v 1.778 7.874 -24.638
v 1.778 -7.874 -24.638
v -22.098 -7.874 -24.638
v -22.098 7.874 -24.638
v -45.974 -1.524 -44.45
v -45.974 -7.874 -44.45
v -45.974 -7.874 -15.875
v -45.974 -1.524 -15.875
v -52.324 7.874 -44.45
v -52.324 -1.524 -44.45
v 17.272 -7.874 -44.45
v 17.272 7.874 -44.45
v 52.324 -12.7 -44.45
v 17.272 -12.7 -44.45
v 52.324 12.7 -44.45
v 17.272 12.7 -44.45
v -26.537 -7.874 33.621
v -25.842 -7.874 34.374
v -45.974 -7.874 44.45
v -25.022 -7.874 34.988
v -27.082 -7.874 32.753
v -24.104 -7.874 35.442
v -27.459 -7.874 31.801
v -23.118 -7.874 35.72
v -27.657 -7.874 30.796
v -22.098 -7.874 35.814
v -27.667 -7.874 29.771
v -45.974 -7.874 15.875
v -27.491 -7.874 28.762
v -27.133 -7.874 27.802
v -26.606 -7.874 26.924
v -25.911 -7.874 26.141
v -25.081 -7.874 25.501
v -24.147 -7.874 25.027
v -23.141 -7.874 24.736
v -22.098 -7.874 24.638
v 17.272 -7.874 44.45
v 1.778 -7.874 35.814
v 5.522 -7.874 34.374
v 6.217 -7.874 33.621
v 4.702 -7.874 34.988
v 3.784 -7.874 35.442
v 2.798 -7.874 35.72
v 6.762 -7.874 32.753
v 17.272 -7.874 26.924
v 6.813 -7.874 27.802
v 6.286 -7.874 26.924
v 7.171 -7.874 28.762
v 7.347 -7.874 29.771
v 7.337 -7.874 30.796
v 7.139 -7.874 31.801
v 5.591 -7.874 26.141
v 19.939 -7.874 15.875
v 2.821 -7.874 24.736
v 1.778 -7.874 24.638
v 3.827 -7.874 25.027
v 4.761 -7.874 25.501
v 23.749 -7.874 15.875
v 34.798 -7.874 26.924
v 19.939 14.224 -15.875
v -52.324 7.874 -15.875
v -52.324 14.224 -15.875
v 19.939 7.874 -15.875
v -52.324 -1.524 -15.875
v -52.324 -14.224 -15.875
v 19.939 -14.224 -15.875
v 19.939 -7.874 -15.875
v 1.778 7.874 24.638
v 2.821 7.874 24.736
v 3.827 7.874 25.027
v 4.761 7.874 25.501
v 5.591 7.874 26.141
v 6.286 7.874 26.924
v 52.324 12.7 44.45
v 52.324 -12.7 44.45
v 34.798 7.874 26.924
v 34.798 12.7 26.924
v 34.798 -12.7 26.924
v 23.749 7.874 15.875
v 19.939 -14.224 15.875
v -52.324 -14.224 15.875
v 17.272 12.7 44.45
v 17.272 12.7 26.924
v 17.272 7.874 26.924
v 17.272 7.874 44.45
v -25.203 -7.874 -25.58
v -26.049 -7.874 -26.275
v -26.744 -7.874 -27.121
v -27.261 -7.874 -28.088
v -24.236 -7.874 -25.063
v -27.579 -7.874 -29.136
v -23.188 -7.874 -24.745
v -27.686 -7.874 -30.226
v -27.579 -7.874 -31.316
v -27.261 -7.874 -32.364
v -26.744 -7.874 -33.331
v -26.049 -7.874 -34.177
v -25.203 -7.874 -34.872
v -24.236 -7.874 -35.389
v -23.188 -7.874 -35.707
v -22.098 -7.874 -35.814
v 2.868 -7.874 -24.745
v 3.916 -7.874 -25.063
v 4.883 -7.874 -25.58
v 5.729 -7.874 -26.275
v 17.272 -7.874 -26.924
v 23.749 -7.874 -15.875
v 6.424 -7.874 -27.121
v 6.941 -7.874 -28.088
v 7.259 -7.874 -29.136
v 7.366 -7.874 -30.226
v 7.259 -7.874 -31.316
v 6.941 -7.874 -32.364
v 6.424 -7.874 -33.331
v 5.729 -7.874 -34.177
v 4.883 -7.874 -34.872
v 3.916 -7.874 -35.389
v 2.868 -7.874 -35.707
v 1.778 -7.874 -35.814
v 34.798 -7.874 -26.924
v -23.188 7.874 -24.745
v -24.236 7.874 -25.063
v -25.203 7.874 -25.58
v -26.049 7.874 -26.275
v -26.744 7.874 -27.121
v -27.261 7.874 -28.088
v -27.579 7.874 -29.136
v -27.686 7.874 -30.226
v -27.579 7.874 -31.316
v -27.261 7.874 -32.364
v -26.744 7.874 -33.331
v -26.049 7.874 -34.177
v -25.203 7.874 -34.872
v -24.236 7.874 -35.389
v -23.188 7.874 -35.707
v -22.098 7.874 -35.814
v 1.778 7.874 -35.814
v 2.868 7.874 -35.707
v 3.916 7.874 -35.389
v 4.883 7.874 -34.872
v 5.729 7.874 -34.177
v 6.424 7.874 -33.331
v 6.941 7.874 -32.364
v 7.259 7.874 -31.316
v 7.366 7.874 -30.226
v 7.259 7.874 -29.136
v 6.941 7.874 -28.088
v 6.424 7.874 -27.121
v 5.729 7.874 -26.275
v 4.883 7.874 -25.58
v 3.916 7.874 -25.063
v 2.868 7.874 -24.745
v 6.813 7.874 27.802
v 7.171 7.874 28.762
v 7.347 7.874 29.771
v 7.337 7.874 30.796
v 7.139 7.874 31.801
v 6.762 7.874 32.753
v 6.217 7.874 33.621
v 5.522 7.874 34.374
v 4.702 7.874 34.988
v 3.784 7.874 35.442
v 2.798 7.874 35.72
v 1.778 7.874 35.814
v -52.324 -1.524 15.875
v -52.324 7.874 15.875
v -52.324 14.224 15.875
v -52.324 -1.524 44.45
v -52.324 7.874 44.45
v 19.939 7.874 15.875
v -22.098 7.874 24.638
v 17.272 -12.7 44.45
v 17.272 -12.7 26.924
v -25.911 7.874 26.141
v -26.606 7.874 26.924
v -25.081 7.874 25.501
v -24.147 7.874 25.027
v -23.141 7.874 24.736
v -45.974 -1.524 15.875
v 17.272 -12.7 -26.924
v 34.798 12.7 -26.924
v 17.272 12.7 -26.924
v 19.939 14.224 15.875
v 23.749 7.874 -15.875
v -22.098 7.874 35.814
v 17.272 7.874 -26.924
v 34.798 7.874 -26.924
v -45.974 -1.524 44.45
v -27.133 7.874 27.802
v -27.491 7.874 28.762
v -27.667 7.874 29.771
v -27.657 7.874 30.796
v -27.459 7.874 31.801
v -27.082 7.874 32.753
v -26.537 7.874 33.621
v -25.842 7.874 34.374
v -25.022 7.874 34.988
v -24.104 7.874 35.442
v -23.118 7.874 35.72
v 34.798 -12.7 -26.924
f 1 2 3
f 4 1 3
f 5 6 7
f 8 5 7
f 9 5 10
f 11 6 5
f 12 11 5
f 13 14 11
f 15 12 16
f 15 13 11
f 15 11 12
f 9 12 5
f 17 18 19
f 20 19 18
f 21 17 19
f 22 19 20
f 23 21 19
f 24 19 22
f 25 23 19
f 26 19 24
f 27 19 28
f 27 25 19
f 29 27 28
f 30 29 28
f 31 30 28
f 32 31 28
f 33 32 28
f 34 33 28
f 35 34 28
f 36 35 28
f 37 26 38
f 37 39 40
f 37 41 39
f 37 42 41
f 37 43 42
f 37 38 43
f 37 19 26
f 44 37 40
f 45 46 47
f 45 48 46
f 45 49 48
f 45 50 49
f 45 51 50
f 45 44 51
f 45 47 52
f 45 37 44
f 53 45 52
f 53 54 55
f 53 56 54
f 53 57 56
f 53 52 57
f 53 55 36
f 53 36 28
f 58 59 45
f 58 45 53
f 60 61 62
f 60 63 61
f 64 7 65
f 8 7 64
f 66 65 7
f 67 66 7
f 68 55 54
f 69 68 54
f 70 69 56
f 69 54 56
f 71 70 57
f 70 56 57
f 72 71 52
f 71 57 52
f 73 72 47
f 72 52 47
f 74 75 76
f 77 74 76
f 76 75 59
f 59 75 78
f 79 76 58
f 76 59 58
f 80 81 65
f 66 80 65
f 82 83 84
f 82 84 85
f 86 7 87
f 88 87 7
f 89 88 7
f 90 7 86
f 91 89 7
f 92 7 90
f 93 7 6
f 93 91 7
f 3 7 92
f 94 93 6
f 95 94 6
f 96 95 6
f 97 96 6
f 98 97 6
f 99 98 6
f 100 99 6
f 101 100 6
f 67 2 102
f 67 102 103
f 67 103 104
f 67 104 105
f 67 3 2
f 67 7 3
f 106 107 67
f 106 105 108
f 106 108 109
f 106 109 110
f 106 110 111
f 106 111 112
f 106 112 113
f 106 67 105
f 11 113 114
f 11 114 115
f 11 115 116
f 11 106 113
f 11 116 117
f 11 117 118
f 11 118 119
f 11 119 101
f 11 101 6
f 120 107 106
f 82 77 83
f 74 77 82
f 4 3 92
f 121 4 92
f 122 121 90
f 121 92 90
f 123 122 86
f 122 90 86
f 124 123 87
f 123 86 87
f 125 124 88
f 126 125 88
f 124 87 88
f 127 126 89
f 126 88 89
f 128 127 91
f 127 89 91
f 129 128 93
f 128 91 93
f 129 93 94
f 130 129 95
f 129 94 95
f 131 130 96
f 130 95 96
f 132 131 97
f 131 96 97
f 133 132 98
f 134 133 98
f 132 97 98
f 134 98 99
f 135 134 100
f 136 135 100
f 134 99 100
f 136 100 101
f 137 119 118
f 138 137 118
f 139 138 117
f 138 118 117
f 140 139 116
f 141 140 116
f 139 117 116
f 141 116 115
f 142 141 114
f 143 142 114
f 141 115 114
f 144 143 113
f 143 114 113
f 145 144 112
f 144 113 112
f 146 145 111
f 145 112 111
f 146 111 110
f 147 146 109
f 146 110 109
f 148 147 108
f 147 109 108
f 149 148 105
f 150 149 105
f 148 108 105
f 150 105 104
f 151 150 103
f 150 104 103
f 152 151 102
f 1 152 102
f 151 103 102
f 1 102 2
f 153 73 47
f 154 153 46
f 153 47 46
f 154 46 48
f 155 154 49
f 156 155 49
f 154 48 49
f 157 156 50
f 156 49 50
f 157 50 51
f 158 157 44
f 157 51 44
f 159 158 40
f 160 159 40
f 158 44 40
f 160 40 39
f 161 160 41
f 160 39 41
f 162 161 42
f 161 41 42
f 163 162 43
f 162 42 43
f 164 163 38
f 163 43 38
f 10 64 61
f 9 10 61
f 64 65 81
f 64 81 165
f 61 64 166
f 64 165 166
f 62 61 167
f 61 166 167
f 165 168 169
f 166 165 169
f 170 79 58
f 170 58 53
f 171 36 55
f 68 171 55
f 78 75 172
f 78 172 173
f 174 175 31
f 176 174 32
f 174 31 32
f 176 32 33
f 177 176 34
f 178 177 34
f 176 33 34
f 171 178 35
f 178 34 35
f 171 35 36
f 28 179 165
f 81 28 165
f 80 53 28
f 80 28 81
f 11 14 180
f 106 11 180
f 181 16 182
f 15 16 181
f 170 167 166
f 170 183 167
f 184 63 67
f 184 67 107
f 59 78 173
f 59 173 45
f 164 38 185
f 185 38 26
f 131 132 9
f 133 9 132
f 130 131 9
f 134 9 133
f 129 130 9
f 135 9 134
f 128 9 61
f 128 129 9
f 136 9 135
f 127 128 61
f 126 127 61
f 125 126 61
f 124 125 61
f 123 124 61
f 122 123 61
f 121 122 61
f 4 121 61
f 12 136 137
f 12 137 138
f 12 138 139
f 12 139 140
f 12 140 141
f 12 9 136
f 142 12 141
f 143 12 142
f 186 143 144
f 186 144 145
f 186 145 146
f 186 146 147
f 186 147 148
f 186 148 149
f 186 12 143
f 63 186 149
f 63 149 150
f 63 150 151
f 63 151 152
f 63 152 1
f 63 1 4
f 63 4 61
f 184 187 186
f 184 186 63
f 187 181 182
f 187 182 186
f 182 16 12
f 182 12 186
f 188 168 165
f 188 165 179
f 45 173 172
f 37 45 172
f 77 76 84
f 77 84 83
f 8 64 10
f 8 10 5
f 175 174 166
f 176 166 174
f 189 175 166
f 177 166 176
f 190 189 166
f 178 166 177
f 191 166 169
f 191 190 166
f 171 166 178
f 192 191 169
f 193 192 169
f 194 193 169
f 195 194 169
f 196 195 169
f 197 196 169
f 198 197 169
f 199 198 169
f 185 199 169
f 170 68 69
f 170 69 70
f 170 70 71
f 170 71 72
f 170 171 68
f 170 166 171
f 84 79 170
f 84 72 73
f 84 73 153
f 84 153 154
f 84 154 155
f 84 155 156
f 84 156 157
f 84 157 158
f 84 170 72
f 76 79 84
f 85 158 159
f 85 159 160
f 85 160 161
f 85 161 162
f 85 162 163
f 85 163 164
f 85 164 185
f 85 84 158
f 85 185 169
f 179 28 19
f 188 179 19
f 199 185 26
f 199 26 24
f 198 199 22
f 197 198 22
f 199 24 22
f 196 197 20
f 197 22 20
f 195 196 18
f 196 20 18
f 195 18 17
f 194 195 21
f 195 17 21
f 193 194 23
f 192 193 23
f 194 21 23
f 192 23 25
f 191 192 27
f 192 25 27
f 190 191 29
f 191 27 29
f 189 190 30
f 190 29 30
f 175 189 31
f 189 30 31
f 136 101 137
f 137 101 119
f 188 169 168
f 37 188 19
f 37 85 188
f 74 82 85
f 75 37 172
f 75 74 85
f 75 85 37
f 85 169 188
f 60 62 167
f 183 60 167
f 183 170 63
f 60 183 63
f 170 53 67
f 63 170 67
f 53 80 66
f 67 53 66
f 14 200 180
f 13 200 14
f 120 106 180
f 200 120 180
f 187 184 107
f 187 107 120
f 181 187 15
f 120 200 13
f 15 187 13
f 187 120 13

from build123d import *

# Parameters (mm, degrees)
F1_DEPTH  = 52.324
F3_DEPTH  = 26.925
F2_W      = 6.35
F2_H      = 17.526
F2_H_2    = 28.575
F2_H_3    = 11.049
F4_DEPTH  = 11.176
F6_DEPTH  = 26.925
F7_DEPTH  = 1.525
F8_W      = 69.596
F8_H      = 28.575
F9_DEPTH  = 6.35
F10_W     = 69.596
F10_H     = 28.575
F11_DEPTH = 6.35


with BuildPart() as f1:
    # F0 (on Right) → F1 (new body, symmetric)
    with BuildSketch(Plane.YZ):
        Polygon((-7.874, 26.924), (-7.874, 15.875), (7.874, 15.875), (7.874, 26.924), (12.7, 26.924), (12.7, 44.45), (-12.7, 44.45), (-12.7, 26.924), align=None)
        Polygon((-7.874, 15.875), (-14.224, 15.875), (-14.224, -15.875), (-7.874, -15.875), (7.874, -15.875), (14.224, -15.875), (14.224, 15.875), (7.874, 15.875), align=None)
        Polygon((7.874, -15.875), (-7.874, -15.875), (-7.874, -26.924), (-12.7, -26.924), (-12.7, -44.45), (12.7, -44.45), (12.7, -26.924), (7.874, -26.924), align=None)
    extrude(amount=F1_DEPTH, both=True)

    # F2 (on face) → F3 (cut, through all)
    with BuildSketch(Plane.XZ.offset(12.7)):
        with BuildLine():
            ThreePointArc((-22.098, 35.814), (-27.08184, 32.753268), (-26.606053, 26.924))
            Line((-26.606053, 26.924), (6.286053, 26.924))
            ThreePointArc((6.286053, 26.924), (6.76184, 32.753268), (1.778, 35.814))
            Line((1.778, 35.814), (-22.098, 35.814))
        make_face()
        with BuildLine():
            Line((6.286053, 26.924), (-26.606053, 26.924))
            ThreePointArc((-26.606053, 26.924), (-24.625268, 25.24216), (-22.098, 24.638))
            Line((-22.098, 24.638), (1.778, 24.638))
            ThreePointArc((1.778, 24.638), (4.305268, 25.24216), (6.286053, 26.924))
        make_face()
        with BuildLine():
            ThreePointArc((-22.098, -24.638), (-27.686, -30.226), (-22.098, -35.814))
            Line((-22.098, -35.814), (1.778, -35.814))
            ThreePointArc((1.778, -35.814), (7.366, -30.226), (1.778, -24.638))
            Line((1.778, -24.638), (-22.098, -24.638))
        make_face()
    extrude(amount=-F3_DEPTH, mode=Mode.SUBTRACT)

    # F2 (on face) → F4 (cut)
    with BuildSketch(Plane.XZ.offset(12.7)):
        with Locations((-49.149, 35.687)):
            Rectangle(F2_W, F2_H)
        with Locations((-49.149, -30.1625)):
            Rectangle(F2_W, F2_H_2)
        with Locations((-49.149, 21.3995)):
            Rectangle(F2_W, F2_H_3)
    extrude(amount=-F4_DEPTH, mode=Mode.SUBTRACT)

    # F5 (on face) → F6 (cut, through all)
    with BuildSketch(Plane.XZ.offset(12.7)):
        Polygon((52.324, -44.45), (52.324, 44.45), (23.749, 15.875), (19.939, 15.875), (19.939, 0), (19.939, -15.875), (23.749, -15.875), align=None)
    extrude(amount=-F6_DEPTH, mode=Mode.SUBTRACT)

    # F5 (on face) → F7 (cut, through all)
    with BuildSketch(Plane.XZ.offset(12.7)):
        Polygon((52.324, -44.45), (52.324, 44.45), (23.749, 15.875), (19.939, 15.875), (19.939, 0), (19.939, -15.875), (23.749, -15.875), align=None)
    extrude(amount=F7_DEPTH, mode=Mode.SUBTRACT)

    # F8 (on face) → F9 (cut)
    with BuildSketch(Plane.XZ.offset(14.224)):
        with Locations((-17.526, 30.1625)):
            Rectangle(F8_W, F8_H)
        with Locations((-17.526, -30.1625)):
            Rectangle(F8_W, F8_H)
    extrude(amount=-F9_DEPTH, mode=Mode.SUBTRACT)

    # F10 (on face) → F11 (cut)
    with BuildSketch(Plane(origin=(0, 14.224, 0), x_dir=(-1, 0, 0), z_dir=(0, 1, 0))):
        with Locations((17.526, 30.1625)):
            Rectangle(F10_W, F10_H)
        with Locations((17.526, -30.1625)):
            Rectangle(F10_W, F10_H)
    extrude(amount=-F11_DEPTH, mode=Mode.SUBTRACT)


solid = f1.part
